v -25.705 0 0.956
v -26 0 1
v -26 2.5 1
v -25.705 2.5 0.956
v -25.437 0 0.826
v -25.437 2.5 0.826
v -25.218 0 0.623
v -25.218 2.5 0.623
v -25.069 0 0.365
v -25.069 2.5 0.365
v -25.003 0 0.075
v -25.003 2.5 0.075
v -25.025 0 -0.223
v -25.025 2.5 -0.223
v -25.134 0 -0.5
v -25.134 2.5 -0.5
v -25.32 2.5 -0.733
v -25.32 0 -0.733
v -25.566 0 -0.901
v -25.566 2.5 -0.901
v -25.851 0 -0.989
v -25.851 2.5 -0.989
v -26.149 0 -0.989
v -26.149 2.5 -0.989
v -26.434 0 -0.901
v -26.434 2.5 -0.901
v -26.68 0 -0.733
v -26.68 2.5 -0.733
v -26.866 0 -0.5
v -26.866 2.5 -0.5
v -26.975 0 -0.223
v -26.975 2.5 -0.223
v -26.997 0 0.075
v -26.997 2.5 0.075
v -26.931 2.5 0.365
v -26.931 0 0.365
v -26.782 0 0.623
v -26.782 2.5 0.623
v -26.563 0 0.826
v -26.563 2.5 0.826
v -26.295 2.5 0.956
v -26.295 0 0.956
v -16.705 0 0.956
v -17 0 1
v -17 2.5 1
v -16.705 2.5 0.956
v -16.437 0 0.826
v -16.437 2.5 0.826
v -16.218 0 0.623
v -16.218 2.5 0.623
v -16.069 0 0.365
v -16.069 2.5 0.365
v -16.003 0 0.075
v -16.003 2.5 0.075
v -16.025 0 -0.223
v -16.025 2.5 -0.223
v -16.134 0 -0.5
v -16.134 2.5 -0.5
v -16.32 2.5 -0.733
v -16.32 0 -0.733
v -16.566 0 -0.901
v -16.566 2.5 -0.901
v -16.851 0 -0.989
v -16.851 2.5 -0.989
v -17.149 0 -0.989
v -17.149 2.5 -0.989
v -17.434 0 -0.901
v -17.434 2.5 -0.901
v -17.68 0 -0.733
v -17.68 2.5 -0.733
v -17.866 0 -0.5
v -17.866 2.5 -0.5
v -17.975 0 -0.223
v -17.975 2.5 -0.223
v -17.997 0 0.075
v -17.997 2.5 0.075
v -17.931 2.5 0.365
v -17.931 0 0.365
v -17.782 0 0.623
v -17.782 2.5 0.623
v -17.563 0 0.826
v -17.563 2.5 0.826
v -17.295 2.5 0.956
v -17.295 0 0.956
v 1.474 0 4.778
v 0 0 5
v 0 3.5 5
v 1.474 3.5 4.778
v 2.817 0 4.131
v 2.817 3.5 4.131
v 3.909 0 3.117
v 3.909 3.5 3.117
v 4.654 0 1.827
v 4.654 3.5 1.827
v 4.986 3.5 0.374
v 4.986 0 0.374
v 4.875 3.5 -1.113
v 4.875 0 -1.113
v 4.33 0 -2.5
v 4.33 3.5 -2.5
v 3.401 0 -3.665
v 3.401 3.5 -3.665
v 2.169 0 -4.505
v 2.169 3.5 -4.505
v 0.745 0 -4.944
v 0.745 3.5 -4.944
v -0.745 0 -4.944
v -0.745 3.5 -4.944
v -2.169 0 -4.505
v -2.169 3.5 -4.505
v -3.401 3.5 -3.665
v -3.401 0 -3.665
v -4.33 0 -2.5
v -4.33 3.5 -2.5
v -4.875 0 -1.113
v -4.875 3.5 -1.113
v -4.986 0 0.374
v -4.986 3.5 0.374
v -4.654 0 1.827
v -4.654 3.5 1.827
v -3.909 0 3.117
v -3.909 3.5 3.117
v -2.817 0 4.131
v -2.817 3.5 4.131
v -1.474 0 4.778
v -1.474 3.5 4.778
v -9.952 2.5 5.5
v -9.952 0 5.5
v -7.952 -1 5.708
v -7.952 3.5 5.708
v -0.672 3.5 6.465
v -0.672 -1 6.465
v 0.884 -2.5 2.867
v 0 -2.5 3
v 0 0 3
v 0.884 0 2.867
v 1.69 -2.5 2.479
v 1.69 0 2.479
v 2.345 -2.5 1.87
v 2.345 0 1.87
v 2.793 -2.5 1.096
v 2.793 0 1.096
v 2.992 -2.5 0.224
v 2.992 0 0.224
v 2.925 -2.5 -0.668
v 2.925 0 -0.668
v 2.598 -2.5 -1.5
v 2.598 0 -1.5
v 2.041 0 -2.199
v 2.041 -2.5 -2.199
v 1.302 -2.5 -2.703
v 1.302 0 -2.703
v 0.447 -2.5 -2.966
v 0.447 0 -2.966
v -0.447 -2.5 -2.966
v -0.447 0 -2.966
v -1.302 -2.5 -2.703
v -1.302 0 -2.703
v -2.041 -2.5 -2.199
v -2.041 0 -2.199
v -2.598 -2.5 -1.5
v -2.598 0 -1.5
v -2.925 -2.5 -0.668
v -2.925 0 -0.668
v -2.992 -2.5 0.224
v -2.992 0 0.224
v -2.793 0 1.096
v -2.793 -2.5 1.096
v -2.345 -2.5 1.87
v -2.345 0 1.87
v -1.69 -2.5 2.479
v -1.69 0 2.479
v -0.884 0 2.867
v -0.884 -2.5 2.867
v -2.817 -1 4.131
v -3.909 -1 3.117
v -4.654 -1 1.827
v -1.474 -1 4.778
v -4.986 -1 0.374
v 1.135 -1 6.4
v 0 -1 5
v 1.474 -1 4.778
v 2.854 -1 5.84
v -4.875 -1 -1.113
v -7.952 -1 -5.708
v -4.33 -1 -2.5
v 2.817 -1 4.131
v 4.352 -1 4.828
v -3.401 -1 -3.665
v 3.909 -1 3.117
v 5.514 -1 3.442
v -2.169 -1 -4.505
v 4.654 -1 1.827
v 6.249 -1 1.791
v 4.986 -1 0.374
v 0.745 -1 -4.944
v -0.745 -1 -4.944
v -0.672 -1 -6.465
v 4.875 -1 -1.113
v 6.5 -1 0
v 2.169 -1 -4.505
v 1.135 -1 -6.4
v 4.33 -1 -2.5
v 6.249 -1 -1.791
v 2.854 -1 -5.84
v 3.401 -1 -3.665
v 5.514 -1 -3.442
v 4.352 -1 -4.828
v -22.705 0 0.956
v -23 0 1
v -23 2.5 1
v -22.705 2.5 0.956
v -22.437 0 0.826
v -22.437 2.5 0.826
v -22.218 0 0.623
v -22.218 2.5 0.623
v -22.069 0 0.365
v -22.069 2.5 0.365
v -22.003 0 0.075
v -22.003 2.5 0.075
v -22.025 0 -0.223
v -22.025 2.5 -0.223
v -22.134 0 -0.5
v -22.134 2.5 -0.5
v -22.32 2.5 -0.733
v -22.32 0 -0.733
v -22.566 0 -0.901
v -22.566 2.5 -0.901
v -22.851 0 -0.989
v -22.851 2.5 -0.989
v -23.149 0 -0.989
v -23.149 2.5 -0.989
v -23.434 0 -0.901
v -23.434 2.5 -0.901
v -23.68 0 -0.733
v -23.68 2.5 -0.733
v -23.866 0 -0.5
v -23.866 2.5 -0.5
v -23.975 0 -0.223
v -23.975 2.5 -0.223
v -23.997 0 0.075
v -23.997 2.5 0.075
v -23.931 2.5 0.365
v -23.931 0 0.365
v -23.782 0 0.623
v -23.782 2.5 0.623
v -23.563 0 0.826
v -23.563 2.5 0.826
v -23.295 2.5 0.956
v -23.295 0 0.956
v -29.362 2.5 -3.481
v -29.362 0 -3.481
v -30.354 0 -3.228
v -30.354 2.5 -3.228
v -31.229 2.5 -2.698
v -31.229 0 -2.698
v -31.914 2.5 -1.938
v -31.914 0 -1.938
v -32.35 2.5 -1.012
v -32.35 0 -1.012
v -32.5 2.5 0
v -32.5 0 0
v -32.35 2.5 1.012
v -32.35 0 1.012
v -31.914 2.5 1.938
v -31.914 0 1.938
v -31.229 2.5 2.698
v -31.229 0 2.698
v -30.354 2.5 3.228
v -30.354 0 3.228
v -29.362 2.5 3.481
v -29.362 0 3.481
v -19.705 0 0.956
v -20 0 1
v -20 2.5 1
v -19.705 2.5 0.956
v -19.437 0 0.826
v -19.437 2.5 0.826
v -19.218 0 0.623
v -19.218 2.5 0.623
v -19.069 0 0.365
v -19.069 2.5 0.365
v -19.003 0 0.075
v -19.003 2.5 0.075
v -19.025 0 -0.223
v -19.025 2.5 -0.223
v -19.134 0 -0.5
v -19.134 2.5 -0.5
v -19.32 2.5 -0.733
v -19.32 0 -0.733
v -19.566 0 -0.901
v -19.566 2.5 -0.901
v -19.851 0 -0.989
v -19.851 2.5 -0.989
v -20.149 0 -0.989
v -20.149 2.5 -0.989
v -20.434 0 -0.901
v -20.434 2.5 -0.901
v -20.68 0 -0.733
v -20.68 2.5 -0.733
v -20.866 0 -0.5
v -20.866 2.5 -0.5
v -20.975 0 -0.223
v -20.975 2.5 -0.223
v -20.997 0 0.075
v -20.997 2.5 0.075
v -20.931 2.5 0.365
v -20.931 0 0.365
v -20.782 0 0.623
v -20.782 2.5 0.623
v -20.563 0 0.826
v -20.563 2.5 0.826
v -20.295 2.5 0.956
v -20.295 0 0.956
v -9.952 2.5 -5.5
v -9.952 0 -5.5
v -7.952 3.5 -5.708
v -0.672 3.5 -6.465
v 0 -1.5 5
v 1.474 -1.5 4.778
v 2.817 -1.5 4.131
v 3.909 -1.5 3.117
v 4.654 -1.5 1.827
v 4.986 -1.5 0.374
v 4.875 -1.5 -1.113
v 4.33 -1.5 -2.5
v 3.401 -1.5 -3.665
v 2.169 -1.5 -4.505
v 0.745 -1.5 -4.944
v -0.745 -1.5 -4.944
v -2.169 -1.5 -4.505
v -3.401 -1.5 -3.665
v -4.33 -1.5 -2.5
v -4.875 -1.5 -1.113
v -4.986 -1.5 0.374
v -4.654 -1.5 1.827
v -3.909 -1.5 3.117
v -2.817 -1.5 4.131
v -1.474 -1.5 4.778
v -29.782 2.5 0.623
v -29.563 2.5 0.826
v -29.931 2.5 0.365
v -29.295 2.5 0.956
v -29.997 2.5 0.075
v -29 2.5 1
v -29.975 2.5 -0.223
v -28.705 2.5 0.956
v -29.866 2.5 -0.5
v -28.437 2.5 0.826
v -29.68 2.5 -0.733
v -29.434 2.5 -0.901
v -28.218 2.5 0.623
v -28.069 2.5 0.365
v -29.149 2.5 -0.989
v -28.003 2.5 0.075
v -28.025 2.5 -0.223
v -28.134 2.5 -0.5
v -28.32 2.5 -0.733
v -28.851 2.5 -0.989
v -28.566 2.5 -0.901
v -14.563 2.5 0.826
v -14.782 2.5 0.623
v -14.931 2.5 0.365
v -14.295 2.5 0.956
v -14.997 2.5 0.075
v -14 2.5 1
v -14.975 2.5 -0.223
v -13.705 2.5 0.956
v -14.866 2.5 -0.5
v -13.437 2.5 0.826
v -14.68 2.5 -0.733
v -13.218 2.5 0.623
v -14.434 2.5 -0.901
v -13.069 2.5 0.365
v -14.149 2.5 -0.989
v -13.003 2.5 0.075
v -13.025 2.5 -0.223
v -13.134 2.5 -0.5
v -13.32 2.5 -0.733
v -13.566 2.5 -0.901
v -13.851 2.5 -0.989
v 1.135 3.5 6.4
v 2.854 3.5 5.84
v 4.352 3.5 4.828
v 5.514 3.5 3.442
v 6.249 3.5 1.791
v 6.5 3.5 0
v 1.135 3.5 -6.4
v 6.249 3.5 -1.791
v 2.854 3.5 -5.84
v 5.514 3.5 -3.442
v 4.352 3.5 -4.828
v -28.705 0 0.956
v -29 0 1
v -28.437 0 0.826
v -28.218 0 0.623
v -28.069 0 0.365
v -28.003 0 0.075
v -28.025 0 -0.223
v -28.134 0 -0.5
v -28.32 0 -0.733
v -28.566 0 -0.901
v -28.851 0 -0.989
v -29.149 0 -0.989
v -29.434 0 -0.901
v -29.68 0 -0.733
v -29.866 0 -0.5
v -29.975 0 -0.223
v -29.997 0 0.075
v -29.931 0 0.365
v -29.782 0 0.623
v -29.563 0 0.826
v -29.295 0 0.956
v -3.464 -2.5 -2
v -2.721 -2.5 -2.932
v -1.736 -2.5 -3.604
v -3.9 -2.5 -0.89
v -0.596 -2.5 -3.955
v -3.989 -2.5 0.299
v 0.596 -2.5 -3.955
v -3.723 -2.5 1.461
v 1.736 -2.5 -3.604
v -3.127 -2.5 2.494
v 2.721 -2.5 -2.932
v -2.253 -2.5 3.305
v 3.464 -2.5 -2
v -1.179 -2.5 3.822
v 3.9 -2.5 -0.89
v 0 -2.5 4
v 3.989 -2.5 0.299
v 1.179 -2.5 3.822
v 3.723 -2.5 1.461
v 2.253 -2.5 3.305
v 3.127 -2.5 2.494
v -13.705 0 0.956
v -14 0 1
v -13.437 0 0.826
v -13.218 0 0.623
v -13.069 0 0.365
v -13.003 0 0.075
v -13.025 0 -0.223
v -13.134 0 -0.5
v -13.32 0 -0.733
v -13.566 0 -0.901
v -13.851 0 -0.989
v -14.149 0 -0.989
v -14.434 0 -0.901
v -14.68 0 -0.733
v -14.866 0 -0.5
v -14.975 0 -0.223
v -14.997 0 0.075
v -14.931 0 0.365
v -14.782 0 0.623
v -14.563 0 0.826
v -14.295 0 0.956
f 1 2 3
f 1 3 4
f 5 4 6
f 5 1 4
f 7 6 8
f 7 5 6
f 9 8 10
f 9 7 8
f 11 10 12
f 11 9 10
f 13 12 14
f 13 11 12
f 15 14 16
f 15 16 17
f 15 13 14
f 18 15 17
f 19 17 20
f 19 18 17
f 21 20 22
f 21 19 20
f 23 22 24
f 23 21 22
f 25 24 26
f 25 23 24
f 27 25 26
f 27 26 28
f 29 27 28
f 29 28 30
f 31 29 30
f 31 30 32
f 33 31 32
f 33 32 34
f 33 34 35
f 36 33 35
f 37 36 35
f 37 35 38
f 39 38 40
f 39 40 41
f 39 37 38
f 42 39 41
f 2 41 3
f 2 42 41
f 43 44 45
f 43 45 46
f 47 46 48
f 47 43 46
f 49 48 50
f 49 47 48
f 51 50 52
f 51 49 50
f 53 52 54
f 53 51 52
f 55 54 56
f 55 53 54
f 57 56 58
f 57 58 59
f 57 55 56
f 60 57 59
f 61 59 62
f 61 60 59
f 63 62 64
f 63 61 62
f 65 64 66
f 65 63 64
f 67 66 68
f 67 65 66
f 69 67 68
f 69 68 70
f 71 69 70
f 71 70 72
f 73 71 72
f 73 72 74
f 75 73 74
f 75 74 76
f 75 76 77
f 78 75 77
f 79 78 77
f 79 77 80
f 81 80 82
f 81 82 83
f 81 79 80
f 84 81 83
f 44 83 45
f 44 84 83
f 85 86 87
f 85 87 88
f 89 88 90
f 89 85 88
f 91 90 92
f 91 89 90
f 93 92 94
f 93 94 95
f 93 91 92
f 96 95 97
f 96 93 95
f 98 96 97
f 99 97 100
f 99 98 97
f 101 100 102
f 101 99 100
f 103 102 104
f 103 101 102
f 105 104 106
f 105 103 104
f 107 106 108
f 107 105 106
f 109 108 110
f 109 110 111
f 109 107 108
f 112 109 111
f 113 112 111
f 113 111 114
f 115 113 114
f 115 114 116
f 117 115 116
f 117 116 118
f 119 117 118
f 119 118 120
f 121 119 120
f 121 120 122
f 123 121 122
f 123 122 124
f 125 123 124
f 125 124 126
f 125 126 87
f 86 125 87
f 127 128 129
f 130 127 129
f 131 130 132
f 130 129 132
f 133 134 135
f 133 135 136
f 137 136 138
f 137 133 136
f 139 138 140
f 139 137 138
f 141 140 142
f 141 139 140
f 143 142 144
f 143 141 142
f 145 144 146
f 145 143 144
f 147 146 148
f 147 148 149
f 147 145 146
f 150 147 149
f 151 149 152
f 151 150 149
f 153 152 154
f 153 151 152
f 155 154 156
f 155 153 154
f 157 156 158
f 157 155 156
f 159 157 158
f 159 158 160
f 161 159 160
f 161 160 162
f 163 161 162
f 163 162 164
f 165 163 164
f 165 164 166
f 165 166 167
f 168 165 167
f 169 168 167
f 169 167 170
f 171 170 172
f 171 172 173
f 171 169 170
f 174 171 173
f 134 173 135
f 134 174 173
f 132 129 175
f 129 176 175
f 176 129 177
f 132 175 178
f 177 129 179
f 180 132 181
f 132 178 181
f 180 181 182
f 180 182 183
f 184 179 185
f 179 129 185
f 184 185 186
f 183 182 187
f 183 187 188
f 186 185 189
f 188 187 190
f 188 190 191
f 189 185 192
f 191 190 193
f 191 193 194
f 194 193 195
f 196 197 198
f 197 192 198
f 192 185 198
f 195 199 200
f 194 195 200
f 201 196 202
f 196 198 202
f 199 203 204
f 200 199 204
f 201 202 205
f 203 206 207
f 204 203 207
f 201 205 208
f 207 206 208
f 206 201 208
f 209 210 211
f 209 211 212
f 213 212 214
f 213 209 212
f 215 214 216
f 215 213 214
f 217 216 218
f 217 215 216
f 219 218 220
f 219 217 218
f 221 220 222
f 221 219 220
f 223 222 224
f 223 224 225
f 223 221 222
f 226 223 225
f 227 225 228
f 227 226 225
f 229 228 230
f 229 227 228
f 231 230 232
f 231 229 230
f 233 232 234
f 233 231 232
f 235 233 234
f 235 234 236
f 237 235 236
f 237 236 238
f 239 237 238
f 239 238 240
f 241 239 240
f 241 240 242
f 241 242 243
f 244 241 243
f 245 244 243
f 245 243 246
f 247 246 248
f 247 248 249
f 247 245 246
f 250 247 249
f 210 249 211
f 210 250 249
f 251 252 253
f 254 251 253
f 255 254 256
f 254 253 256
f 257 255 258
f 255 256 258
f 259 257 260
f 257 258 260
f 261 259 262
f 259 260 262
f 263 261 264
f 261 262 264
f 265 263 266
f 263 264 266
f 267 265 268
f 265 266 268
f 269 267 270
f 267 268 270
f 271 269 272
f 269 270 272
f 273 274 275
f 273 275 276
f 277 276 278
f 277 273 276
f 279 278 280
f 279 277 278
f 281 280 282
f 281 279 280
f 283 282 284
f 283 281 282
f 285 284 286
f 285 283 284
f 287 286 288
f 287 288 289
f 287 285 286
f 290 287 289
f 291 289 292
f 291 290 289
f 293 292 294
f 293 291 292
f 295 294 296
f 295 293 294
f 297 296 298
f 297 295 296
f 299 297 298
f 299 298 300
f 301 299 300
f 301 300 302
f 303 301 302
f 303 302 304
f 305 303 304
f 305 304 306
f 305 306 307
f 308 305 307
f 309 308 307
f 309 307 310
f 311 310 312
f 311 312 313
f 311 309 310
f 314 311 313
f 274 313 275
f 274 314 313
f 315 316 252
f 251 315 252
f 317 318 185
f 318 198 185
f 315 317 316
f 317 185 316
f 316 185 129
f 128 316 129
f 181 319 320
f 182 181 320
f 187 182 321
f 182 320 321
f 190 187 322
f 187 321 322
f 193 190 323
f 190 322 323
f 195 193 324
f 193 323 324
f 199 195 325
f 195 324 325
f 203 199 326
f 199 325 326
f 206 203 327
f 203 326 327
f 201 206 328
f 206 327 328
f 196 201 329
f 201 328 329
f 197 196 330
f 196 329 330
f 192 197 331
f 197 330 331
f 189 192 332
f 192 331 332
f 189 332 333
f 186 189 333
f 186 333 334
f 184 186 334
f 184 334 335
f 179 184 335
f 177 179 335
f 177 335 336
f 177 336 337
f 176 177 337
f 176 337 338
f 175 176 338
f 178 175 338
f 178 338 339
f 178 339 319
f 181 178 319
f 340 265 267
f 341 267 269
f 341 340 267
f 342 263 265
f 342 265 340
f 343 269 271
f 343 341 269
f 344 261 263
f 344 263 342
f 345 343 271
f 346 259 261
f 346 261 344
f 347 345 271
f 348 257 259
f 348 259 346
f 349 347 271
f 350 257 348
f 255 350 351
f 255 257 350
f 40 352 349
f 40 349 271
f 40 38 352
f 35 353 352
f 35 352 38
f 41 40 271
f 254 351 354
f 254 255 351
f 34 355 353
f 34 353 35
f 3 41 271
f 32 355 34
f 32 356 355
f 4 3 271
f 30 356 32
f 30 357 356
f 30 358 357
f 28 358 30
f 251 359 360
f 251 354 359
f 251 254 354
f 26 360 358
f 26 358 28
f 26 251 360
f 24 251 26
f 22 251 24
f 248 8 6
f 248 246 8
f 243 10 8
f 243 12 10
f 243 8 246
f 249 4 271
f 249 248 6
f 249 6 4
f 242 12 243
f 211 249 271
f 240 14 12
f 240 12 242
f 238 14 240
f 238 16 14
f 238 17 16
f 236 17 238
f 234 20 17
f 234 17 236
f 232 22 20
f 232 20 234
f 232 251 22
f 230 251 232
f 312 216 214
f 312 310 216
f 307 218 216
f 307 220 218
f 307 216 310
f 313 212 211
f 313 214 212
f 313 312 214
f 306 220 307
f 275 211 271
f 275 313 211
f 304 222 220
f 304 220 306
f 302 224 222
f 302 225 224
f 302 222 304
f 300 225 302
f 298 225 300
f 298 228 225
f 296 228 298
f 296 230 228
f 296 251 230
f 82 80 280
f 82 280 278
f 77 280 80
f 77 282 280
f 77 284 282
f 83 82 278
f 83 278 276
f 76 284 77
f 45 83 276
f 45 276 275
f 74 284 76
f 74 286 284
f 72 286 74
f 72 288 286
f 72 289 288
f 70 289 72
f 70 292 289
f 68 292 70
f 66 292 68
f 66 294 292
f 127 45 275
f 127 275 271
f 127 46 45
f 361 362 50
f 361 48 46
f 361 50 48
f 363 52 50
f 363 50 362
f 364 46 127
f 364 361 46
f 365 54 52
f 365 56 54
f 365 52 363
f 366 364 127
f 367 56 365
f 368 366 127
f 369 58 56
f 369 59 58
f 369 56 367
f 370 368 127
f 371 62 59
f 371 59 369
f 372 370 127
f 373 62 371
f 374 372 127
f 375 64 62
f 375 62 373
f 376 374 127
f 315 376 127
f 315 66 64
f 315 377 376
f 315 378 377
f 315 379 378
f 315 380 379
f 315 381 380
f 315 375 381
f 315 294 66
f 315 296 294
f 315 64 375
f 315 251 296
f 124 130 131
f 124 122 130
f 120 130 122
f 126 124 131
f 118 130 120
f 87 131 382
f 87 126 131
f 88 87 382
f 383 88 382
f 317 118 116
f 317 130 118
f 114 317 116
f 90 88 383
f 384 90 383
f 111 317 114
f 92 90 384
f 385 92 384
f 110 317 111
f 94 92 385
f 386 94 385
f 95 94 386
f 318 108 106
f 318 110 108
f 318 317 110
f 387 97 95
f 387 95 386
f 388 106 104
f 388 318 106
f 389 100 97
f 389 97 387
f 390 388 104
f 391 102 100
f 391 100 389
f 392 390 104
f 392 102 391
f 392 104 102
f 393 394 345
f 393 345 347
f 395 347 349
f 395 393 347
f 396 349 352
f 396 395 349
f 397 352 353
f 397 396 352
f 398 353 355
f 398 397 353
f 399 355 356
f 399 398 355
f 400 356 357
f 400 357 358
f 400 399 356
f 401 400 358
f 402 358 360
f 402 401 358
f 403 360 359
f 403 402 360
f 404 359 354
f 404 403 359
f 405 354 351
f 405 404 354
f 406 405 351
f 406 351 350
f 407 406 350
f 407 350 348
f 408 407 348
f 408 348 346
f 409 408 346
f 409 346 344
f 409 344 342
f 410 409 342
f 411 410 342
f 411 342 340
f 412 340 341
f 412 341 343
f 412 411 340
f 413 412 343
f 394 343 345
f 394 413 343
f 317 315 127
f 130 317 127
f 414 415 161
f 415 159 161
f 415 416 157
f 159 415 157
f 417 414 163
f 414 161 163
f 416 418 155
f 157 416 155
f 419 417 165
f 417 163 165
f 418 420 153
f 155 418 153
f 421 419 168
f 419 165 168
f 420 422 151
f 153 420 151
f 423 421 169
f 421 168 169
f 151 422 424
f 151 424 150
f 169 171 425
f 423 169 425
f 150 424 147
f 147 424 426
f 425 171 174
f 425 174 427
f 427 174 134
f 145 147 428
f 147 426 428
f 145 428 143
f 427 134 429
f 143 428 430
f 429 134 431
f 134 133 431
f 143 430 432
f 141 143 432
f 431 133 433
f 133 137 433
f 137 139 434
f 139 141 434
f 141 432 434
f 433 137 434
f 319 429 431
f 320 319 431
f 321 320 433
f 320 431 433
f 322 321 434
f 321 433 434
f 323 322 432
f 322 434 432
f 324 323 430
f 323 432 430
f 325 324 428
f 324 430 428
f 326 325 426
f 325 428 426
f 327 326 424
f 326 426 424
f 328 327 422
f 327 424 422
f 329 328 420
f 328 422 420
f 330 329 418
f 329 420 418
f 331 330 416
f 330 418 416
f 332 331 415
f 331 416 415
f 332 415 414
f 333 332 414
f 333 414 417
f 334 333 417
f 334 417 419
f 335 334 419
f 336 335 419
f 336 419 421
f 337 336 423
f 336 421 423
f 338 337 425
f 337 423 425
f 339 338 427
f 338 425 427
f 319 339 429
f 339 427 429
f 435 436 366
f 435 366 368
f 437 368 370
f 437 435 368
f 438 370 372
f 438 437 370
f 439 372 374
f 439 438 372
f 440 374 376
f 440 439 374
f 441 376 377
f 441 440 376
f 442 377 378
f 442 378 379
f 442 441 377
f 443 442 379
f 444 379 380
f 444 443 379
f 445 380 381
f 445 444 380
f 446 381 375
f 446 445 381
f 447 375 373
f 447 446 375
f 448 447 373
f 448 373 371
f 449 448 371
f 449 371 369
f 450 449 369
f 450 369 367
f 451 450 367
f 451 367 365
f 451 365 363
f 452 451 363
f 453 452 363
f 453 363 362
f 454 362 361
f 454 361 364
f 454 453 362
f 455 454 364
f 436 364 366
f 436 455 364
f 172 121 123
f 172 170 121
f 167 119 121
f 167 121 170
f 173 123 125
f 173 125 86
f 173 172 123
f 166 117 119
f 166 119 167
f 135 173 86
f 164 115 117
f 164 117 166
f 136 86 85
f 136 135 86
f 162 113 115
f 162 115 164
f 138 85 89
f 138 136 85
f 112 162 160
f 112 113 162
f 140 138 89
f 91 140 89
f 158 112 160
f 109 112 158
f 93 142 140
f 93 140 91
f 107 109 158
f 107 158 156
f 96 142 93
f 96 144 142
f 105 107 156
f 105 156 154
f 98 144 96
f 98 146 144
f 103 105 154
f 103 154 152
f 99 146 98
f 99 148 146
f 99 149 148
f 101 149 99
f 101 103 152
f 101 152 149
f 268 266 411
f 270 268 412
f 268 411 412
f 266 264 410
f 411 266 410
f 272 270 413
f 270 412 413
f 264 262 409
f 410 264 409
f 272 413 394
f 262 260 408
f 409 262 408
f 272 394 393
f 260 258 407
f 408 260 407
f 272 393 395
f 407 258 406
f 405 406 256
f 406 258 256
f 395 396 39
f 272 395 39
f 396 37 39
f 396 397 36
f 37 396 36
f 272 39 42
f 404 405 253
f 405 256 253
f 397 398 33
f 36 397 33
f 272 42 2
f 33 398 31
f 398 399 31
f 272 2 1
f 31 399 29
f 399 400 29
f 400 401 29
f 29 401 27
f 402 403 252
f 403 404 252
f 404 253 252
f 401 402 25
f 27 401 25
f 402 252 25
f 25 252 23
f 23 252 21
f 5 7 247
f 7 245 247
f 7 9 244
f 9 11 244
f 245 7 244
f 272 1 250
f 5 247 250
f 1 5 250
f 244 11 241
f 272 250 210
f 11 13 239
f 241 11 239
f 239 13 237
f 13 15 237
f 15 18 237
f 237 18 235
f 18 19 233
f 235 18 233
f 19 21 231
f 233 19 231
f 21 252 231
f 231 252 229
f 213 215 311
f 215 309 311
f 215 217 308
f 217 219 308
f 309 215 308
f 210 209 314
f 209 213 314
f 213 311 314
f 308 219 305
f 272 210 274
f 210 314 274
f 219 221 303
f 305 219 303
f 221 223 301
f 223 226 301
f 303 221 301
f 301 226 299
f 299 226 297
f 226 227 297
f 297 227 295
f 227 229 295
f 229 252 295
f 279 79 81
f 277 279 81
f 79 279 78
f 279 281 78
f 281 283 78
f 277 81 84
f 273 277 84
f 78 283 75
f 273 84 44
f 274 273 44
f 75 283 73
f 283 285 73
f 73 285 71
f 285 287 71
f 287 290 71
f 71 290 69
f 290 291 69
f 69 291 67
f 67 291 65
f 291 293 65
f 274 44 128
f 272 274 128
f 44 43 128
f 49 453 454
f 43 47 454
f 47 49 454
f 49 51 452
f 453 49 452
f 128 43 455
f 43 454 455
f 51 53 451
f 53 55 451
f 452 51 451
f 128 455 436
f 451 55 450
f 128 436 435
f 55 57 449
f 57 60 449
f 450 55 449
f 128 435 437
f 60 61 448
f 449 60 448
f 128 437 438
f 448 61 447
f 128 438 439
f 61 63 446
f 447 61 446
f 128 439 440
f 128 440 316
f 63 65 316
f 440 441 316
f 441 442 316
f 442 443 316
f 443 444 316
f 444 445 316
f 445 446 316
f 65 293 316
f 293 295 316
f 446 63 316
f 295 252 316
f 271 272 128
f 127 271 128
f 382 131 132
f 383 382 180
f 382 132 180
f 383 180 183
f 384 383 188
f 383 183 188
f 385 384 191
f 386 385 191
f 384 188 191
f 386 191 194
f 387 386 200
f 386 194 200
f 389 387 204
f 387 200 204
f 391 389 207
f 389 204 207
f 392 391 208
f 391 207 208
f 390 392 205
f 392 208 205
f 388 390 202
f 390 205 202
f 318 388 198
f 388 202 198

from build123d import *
from OCP.BRepFilletAPI import BRepFilletAPI_MakeChamfer

# Parameters (mm, degrees)
SKETCH_1_R       = 1
SKETCH_1_R_2     = 5
EXTRUDE_1_DEPTH  = 2.5
EXTRUDE_START    = 2.5
SKETCH_1_3_R     = 5
EXTRUDE_2_DEPTH  = 1
EXTRUDE_START_2  = -1
SKETCH_1_4_R     = 5
EXTRUDE_3_DEPTH  = 1
EXTRUDE_START_3  = -2.5
SKETCH_1_5_R     = 5
SKETCH_1_5_R_2   = 3.5
SKETCH_1_5_R_3   = 3
EXTRUDE_4_DEPTH  = 2.5
CHAMFER_1_SIZE   = 2
CHAMFER_1_SIZE_2 = 1
CHAMFER_2_SIZE   = 1


with BuildPart() as part:
    # Эскиз1 → Бобышка-Вытянуть1 (new body)
    # profile 1 of 2: a face of its own
    with BuildSketch(Plane(origin=(0, 0, 0), x_dir=(1, 0, 0), z_dir=(0, 1, 0))):
        with BuildLine():
            ThreePointArc((-29.362068966, 3.481221921), (-32.5, 0), (-29.362068966, -3.481221921))
            Line((-29.362068966, -3.481221921), (-9.951914627, -5.5))
            Line((-9.951914627, -5.5), (-9.951914627, 5.5))
            Line((-9.951914627, 5.5), (-29.362068966, 3.481221921))
        make_face()
        with Locations(Location((-29, 0, 0), (0, 0, 270))):
            Circle(SKETCH_1_R, mode=Mode.SUBTRACT)
        with Locations(Location((-26, 0, 0), (0, 0, 270))):
            Circle(SKETCH_1_R, mode=Mode.SUBTRACT)
        with Locations(Location((-23, 0, 0), (0, 0, 270))):
            Circle(SKETCH_1_R, mode=Mode.SUBTRACT)
        with Locations(Location((-20, 0, 0), (0, 0, 270))):
            Circle(SKETCH_1_R, mode=Mode.SUBTRACT)
        with Locations(Location((-17, 0, 0), (0, 0, 270))):
            Circle(SKETCH_1_R, mode=Mode.SUBTRACT)
        with Locations(Location((-14, 0, 0), (0, 0, 270))):
            Circle(SKETCH_1_R, mode=Mode.SUBTRACT)
    # profile 2 of 2: a face of its own
    with BuildSketch(Plane(origin=(0, 0, 0), x_dir=(1, 0, 0), z_dir=(0, 1, 0))):
        with BuildLine():
            Line((-9.951914627, 5.5), (-9.951914627, -5.5))
            Line((-9.951914627, -5.5), (-0.672413793, -6.465126425))
            ThreePointArc((-0.672413793, -6.465126425), (6.5, 0), (-0.672413793, 6.465126425))
            Line((-0.672413793, 6.465126425), (-9.951914627, 5.5))
        make_face()
        with Locations(Location((0, 0, 0), (0, 0, 270))):
            Circle(SKETCH_1_R_2, mode=Mode.SUBTRACT)
    extrude(amount=EXTRUDE_1_DEPTH)

    # Эскиз1<3> → Бобышка-Вытянуть2 (add)
    with BuildSketch(Plane(origin=(0, 0, 0), x_dir=(1, 0, 0), z_dir=(0, 1, 0)).offset(EXTRUDE_START)):
        with BuildLine():
            Line((-9.951914627, 5.5), (-9.951914627, -5.5))
            Line((-9.951914627, -5.5), (-0.672413793, -6.465126425))
            ThreePointArc((-0.672413793, -6.465126425), (6.5, 0), (-0.672413793, 6.465126425))
            Line((-0.672413793, 6.465126425), (-9.951914627, 5.5))
        make_face()
        with Locations(Location((0, 0, 0), (0, 0, 270))):
            Circle(SKETCH_1_3_R, mode=Mode.SUBTRACT)
    extrude(amount=EXTRUDE_2_DEPTH)

    # Эскиз1<4> → Бобышка-Вытянуть3 (add)
    with BuildSketch(Plane(origin=(0, 0, 0), x_dir=(1, 0, 0), z_dir=(0, 1, 0)).offset(EXTRUDE_START_2)):
        with BuildLine():
            Line((-9.951914627, 5.5), (-9.951914627, -5.5))
            Line((-9.951914627, -5.5), (-0.672413793, -6.465126425))
            ThreePointArc((-0.672413793, -6.465126425), (6.5, 0), (-0.672413793, 6.465126425))
            Line((-0.672413793, 6.465126425), (-9.951914627, 5.5))
        make_face()
        with Locations(Location((0, 0, 0), (0, 0, 270))):
            Circle(SKETCH_1_4_R, mode=Mode.SUBTRACT)
    extrude(amount=EXTRUDE_3_DEPTH)

    # Эскиз1<5> → Бобышка-Вытянуть4 (add)
    # profile 1 of 2: a face of its own
    with BuildSketch(Plane(origin=(0, 0, 0), x_dir=(1, 0, 0), z_dir=(0, 1, 0)).offset(EXTRUDE_START_3)):
        with Locations(Location((0, 0, 0), (0, 0, 270))):
            Circle(SKETCH_1_5_R)
        Circle(SKETCH_1_5_R_2, mode=Mode.SUBTRACT)
    # profile 2 of 2: a face of its own
    with BuildSketch(Plane(origin=(0, 0, 0), x_dir=(1, 0, 0), z_dir=(0, 1, 0)).offset(EXTRUDE_START_3)):
        Circle(SKETCH_1_5_R_2)
        with Locations(Location((0, 0, 0), (0, 0, 270))):
            Circle(SKETCH_1_5_R_3, mode=Mode.SUBTRACT)
    extrude(amount=EXTRUDE_4_DEPTH)

    # Фаска1
    chamfer_1_edges_1 = [part.edges().sort_by_distance(p)[0] for p in [
        (-9.951914627, 3.5, 0),
    ]]
    chamfer_1_side_1 = [part.faces().sort_by_distance(p)[0] for p in [
        (-9.931914627, 3.5, 0),
    ]]
    chamfer_1_edges_2 = [part.edges().sort_by_distance(p)[0] for p in [
        (-9.951914627, -1, 0),
    ]]
    chamfer_1_side_2 = [part.faces().sort_by_distance(p)[0] for p in [
        (-9.951914627, -0.98, 0),
    ]]
    chamfer_1 = BRepFilletAPI_MakeChamfer(part.part.solid().wrapped)
    for e in chamfer_1_edges_1:
        chamfer_1.Add(CHAMFER_1_SIZE - 0.0001, CHAMFER_1_SIZE_2 - 0.0001, e.wrapped, chamfer_1_side_1[0].wrapped)
    for e in chamfer_1_edges_2:
        chamfer_1.Add(CHAMFER_1_SIZE_2 - 0.0001, CHAMFER_1_SIZE - 0.0001, e.wrapped, chamfer_1_side_2[0].wrapped)
    add(Compound.cast(chamfer_1.Shape()), mode=Mode.REPLACE)  # a hair under: the kernel refuses the full size

    # Фаска2
    chamfer_2_edges = [part.edges().sort_by_distance(p)[0] for p in [
        (0, -2.5, -5),
    ]]
    chamfer(chamfer_2_edges, length=CHAMFER_2_SIZE)


solid = part.part
